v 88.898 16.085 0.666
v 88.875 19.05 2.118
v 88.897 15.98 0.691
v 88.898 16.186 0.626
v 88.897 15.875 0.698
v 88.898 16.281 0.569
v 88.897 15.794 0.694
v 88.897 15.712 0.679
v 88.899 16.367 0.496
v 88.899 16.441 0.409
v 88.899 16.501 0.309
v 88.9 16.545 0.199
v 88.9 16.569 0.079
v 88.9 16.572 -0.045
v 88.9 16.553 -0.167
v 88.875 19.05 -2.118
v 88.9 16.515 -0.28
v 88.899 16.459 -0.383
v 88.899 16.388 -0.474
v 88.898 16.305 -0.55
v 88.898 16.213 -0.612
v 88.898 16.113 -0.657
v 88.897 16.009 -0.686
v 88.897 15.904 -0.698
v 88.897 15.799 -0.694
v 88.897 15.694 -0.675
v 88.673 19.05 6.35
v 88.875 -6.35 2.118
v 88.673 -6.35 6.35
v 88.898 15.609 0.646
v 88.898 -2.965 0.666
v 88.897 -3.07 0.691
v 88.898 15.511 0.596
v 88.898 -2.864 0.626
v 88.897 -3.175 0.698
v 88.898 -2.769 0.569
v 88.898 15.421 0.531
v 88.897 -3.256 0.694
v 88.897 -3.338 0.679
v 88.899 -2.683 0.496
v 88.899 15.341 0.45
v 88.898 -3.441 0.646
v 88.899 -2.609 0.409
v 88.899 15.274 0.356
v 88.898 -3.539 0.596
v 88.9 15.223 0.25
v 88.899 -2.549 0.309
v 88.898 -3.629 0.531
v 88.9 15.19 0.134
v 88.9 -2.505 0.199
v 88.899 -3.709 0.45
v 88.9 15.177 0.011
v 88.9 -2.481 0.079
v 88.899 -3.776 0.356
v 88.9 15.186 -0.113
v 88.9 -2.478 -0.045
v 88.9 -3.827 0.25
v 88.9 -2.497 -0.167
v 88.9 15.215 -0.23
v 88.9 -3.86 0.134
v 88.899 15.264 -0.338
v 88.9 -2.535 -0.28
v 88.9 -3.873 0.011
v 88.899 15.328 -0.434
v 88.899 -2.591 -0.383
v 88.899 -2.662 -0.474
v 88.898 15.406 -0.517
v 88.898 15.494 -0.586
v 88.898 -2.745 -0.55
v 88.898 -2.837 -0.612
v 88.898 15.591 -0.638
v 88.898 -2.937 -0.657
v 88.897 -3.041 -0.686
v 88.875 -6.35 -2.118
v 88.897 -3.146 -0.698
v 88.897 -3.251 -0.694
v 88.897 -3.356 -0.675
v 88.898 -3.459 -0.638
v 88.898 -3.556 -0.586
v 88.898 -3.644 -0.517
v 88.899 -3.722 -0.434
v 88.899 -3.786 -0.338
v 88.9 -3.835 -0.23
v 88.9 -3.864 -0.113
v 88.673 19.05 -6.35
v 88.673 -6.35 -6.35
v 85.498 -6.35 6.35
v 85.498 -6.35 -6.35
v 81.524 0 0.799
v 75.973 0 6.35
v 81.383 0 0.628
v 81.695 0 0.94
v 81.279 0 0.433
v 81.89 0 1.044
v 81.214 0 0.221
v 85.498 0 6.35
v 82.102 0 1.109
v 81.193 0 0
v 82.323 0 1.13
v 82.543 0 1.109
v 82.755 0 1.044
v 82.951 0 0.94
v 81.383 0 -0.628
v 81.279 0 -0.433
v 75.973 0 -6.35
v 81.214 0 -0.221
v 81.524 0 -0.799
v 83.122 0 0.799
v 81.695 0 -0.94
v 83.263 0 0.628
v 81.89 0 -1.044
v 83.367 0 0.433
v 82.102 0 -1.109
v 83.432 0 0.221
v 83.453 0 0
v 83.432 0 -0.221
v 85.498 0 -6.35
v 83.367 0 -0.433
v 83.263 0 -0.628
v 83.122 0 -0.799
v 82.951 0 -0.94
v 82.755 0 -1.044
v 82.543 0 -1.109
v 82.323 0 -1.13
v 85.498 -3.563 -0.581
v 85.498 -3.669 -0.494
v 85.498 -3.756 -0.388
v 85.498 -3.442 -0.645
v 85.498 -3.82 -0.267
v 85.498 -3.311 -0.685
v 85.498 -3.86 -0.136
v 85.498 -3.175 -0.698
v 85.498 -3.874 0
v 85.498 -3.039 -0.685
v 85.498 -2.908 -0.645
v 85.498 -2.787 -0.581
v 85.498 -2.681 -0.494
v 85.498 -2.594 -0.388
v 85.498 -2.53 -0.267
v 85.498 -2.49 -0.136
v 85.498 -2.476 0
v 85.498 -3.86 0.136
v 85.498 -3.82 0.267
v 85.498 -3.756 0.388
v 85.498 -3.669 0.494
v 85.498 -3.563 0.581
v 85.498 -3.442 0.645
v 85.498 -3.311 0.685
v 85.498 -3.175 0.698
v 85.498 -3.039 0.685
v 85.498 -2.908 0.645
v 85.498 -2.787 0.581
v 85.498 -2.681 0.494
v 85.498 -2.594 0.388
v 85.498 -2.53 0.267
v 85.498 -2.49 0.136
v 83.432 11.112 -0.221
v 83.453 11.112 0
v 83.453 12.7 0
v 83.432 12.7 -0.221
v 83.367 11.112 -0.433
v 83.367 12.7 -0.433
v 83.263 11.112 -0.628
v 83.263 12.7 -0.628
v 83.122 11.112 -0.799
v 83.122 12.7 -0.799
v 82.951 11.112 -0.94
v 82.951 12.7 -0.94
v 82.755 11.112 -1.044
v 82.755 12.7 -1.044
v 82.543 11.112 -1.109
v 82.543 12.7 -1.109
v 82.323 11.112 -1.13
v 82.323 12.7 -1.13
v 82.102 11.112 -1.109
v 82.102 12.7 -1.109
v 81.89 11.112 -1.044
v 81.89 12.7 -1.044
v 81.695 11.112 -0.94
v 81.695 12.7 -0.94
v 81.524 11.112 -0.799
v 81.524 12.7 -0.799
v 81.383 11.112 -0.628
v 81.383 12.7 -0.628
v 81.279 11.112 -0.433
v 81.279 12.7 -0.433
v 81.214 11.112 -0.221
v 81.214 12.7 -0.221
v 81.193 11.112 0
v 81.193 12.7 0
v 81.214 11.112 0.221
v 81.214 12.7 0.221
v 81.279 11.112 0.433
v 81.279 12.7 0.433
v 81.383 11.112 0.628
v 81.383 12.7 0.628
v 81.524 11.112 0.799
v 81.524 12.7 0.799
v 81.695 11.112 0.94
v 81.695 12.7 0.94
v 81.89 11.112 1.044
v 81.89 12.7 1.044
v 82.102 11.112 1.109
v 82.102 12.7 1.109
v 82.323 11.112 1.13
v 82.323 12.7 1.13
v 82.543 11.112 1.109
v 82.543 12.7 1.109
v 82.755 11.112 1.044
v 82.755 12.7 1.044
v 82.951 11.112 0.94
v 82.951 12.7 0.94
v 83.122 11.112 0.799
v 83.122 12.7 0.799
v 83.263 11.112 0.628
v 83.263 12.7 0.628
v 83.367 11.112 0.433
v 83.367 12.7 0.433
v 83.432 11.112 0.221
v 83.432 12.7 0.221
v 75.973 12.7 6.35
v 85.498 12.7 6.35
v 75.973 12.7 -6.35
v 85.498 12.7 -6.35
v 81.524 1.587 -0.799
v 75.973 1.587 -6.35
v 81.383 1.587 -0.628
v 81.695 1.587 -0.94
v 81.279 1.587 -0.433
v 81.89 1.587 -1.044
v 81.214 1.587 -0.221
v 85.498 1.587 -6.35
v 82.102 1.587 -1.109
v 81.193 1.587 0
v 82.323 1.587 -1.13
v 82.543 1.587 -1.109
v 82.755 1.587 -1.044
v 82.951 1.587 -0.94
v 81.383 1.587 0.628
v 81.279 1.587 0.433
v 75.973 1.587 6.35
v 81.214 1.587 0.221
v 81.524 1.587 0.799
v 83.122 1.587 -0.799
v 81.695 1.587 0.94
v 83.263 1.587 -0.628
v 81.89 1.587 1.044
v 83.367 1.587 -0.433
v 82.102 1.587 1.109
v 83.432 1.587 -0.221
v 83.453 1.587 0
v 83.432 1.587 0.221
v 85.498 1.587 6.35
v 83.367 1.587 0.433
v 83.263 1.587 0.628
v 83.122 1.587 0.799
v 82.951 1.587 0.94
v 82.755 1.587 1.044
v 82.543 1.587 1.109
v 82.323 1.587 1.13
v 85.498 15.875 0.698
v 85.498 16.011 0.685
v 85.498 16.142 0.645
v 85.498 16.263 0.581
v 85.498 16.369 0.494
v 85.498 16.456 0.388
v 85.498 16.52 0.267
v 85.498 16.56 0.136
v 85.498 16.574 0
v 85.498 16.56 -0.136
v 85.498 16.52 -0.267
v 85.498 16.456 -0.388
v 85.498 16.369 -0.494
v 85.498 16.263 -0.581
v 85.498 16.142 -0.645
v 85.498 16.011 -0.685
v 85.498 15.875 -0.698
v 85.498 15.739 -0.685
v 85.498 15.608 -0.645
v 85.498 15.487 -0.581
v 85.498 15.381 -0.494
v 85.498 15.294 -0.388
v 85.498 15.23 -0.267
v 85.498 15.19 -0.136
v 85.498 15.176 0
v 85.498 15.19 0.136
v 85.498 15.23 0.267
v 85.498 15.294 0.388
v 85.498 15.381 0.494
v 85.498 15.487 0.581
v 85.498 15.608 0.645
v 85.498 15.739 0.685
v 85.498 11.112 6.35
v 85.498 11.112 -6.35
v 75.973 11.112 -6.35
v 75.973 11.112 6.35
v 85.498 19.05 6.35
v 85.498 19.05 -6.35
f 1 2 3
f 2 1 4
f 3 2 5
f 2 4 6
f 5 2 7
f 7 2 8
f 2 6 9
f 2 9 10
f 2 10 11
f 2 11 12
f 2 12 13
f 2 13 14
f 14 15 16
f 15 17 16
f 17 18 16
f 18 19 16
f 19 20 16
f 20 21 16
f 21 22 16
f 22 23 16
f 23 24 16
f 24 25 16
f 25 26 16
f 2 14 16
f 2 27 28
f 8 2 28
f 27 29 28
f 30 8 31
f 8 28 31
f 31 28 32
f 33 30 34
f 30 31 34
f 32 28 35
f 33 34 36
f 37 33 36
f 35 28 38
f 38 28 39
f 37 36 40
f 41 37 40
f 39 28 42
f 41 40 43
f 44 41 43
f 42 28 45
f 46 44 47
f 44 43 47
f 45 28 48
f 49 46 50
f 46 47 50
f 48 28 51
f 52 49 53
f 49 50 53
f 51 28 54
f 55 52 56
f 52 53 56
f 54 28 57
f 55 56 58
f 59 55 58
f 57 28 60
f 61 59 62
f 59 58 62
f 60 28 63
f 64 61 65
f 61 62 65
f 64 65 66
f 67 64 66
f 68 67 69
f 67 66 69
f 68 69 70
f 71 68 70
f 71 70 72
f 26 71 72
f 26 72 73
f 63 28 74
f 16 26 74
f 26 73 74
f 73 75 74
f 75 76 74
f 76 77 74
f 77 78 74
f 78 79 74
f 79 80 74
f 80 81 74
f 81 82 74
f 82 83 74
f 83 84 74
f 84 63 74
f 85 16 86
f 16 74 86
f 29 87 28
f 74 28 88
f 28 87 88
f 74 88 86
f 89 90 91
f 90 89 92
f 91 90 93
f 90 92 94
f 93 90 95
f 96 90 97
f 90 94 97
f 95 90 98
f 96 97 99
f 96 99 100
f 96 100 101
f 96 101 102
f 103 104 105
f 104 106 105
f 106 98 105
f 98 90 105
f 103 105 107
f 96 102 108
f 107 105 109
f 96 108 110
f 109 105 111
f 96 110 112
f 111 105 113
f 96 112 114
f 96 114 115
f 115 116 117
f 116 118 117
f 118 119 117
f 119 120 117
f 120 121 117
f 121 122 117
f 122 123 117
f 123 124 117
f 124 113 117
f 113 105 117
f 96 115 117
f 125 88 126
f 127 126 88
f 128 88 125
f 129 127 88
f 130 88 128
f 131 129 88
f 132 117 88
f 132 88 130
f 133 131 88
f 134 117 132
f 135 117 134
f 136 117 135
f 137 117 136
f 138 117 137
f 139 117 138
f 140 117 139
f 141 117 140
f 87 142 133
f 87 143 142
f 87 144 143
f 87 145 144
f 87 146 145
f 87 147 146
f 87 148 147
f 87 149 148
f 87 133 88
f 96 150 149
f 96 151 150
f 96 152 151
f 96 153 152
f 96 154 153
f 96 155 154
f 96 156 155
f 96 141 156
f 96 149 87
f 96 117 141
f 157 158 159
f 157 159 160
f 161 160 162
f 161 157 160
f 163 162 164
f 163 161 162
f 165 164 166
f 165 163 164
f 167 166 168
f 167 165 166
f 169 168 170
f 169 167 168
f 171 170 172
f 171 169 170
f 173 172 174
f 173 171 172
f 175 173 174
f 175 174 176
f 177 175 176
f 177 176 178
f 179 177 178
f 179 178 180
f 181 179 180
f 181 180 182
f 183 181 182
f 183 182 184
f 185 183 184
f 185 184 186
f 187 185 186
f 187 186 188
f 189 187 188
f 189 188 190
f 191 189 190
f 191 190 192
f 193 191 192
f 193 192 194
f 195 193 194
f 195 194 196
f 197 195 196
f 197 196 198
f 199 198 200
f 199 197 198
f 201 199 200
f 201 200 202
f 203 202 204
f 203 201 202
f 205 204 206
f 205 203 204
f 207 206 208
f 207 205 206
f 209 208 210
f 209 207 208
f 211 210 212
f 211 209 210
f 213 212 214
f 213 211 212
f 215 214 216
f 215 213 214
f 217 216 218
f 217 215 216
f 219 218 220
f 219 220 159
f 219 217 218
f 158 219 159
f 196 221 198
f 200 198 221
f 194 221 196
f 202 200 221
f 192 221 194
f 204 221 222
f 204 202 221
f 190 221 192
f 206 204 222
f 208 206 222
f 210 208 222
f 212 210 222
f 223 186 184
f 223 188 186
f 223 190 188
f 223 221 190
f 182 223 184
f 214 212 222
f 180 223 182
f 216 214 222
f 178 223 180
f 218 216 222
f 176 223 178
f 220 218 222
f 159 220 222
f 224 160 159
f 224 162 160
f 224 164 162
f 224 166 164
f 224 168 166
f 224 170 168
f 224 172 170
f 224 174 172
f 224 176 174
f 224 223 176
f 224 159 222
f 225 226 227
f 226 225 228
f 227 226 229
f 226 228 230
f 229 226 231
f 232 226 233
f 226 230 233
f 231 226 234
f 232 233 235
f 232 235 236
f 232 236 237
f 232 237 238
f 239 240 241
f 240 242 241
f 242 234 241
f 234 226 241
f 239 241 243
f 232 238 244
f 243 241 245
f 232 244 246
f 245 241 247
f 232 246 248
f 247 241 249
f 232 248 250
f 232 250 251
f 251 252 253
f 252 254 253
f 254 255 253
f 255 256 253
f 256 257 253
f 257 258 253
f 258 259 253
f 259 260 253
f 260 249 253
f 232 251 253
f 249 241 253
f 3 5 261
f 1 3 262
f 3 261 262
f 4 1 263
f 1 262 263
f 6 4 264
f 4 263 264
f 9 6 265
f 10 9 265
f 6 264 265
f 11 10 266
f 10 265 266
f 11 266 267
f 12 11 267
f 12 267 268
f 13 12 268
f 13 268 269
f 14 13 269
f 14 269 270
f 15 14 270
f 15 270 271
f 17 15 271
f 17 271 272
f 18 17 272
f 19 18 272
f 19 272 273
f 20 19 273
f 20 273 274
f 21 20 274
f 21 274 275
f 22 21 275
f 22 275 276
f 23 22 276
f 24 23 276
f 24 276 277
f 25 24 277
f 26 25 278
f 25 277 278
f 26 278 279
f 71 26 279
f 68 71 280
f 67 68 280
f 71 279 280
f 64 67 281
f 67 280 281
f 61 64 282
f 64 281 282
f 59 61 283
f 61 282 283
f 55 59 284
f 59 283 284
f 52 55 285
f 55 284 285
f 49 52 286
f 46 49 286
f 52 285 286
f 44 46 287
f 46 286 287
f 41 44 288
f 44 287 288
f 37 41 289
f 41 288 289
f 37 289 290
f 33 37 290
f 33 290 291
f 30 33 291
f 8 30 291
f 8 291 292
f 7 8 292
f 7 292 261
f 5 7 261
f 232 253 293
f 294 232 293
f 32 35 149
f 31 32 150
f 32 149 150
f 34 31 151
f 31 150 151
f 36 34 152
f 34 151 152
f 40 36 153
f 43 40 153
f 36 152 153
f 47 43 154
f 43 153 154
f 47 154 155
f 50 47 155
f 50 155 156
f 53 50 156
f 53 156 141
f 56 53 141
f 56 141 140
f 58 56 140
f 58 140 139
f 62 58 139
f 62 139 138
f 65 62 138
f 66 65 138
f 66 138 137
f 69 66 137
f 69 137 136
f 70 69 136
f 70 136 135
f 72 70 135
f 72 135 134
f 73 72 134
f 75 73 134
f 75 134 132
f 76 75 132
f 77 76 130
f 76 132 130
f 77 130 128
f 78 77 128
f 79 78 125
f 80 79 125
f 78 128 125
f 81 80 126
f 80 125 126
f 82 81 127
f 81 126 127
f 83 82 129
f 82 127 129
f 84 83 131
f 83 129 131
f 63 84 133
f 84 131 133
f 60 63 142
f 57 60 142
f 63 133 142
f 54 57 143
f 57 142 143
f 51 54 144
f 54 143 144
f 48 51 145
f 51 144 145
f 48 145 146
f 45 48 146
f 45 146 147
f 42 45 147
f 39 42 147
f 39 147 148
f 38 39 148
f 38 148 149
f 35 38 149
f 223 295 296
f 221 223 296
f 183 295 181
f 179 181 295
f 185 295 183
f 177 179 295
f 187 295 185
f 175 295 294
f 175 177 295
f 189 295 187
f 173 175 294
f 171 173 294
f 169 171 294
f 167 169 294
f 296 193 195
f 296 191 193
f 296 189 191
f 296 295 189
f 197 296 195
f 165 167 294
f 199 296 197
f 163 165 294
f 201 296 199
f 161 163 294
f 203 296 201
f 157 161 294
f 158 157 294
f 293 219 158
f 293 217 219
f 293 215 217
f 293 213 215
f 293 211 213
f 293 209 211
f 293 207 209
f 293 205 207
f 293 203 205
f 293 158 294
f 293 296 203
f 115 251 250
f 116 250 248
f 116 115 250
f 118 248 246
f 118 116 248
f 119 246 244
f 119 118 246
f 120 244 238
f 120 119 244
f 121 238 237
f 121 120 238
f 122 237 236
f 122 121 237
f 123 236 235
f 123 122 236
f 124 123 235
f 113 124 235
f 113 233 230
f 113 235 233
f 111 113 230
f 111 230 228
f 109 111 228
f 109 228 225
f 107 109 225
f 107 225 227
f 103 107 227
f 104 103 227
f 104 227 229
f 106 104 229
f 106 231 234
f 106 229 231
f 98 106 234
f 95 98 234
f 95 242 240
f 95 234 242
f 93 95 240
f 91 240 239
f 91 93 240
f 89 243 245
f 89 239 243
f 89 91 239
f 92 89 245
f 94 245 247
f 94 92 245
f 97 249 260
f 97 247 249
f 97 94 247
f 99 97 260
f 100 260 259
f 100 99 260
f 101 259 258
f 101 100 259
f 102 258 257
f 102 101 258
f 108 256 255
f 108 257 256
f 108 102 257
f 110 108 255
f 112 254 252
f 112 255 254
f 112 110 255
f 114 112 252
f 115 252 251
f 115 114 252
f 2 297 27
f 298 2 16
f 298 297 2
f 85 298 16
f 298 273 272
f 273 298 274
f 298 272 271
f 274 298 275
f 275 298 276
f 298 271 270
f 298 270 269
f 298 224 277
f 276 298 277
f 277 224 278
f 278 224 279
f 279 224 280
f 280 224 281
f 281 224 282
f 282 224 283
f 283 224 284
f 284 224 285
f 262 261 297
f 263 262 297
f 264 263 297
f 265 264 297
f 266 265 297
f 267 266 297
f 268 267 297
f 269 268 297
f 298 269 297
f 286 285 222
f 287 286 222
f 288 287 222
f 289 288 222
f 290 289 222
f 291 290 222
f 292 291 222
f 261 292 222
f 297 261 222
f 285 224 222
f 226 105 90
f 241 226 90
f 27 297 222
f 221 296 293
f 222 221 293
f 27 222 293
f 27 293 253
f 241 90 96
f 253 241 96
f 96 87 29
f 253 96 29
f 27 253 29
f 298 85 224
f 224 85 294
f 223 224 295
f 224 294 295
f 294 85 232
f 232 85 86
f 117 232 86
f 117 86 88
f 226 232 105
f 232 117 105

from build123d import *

# Parameters (mm, degrees)
SKETCH1_R                = 1.1303
BOSS_EXTRUDE1_DEPTH      = 12.7
SKETCH2_W                = 9.525
SKETCH2_H                = 9.525
CUT_EXTRUDE1_DEPTH       = 13.7
BOSS_EXTRUDE2_DEPTH      = 6.35
BOSS_EXTRUDE2_DEPTH_BACK = 19.05
SKETCH5_R                = 0.6985
CUT_EXTRUDE2_DEPTH       = 4.402075722


with BuildPart() as part:
    # Sketch1 → Boss-Extrude1 (new body)
    with BuildSketch(Plane(origin=(0, 0, 0), x_dir=(1, 0, 0), z_dir=(0, 1, 0))):
        with BuildLine():
            Line((75.972924278, -6.35), (88.672924278, -6.35))
            ThreePointArc((88.672924278, -6.35), (88.9, 0), (88.672924278, 6.35))
            Line((88.672924278, 6.35), (75.972924278, 6.35))
            Line((75.972924278, 6.35), (75.972924278, -6.35))
        make_face()
        with Locations((82.322924278, 0)):
            Circle(SKETCH1_R, mode=Mode.SUBTRACT)
    extrude(amount=BOSS_EXTRUDE1_DEPTH)

    # Sketch2 → Cut-Extrude1 (cut, through all)
    with BuildSketch(Plane.XY.offset(6.35)):
        with Locations((80.735424278, 6.35)):
            Rectangle(SKETCH2_W, SKETCH2_H)
    extrude(amount=-CUT_EXTRUDE1_DEPTH, mode=Mode.SUBTRACT)

    # Sketch3 → Boss-Extrude2 (add, two sides)
    with BuildSketch(Plane(origin=(0, 12.7, 0), x_dir=(1, 0, 0), z_dir=(0, 1, 0))) as boss_extrude2_sk:
        with BuildLine():
            Line((85.497924278, -6.35), (88.672924278, -6.35))
            ThreePointArc((88.672924278, -6.35), (88.9, 0), (88.672924278, 6.35))
            Line((88.672924278, 6.35), (85.497924278, 6.35))
            Line((85.497924278, 6.35), (85.497924278, -6.35))
        make_face()
    extrude(amount=BOSS_EXTRUDE2_DEPTH)
    extrude(boss_extrude2_sk.sketch, amount=-BOSS_EXTRUDE2_DEPTH_BACK)

    # Sketch5 → Cut-Extrude2 (cut, through all)
    with BuildSketch(Plane.ZY.offset(-85.497924278)):
        with Locations((0, 15.875)):
            Circle(SKETCH5_R)
        with Locations((0, -3.175)):
            Circle(SKETCH5_R)
    extrude(amount=-CUT_EXTRUDE2_DEPTH, mode=Mode.SUBTRACT)


solid = part.part
